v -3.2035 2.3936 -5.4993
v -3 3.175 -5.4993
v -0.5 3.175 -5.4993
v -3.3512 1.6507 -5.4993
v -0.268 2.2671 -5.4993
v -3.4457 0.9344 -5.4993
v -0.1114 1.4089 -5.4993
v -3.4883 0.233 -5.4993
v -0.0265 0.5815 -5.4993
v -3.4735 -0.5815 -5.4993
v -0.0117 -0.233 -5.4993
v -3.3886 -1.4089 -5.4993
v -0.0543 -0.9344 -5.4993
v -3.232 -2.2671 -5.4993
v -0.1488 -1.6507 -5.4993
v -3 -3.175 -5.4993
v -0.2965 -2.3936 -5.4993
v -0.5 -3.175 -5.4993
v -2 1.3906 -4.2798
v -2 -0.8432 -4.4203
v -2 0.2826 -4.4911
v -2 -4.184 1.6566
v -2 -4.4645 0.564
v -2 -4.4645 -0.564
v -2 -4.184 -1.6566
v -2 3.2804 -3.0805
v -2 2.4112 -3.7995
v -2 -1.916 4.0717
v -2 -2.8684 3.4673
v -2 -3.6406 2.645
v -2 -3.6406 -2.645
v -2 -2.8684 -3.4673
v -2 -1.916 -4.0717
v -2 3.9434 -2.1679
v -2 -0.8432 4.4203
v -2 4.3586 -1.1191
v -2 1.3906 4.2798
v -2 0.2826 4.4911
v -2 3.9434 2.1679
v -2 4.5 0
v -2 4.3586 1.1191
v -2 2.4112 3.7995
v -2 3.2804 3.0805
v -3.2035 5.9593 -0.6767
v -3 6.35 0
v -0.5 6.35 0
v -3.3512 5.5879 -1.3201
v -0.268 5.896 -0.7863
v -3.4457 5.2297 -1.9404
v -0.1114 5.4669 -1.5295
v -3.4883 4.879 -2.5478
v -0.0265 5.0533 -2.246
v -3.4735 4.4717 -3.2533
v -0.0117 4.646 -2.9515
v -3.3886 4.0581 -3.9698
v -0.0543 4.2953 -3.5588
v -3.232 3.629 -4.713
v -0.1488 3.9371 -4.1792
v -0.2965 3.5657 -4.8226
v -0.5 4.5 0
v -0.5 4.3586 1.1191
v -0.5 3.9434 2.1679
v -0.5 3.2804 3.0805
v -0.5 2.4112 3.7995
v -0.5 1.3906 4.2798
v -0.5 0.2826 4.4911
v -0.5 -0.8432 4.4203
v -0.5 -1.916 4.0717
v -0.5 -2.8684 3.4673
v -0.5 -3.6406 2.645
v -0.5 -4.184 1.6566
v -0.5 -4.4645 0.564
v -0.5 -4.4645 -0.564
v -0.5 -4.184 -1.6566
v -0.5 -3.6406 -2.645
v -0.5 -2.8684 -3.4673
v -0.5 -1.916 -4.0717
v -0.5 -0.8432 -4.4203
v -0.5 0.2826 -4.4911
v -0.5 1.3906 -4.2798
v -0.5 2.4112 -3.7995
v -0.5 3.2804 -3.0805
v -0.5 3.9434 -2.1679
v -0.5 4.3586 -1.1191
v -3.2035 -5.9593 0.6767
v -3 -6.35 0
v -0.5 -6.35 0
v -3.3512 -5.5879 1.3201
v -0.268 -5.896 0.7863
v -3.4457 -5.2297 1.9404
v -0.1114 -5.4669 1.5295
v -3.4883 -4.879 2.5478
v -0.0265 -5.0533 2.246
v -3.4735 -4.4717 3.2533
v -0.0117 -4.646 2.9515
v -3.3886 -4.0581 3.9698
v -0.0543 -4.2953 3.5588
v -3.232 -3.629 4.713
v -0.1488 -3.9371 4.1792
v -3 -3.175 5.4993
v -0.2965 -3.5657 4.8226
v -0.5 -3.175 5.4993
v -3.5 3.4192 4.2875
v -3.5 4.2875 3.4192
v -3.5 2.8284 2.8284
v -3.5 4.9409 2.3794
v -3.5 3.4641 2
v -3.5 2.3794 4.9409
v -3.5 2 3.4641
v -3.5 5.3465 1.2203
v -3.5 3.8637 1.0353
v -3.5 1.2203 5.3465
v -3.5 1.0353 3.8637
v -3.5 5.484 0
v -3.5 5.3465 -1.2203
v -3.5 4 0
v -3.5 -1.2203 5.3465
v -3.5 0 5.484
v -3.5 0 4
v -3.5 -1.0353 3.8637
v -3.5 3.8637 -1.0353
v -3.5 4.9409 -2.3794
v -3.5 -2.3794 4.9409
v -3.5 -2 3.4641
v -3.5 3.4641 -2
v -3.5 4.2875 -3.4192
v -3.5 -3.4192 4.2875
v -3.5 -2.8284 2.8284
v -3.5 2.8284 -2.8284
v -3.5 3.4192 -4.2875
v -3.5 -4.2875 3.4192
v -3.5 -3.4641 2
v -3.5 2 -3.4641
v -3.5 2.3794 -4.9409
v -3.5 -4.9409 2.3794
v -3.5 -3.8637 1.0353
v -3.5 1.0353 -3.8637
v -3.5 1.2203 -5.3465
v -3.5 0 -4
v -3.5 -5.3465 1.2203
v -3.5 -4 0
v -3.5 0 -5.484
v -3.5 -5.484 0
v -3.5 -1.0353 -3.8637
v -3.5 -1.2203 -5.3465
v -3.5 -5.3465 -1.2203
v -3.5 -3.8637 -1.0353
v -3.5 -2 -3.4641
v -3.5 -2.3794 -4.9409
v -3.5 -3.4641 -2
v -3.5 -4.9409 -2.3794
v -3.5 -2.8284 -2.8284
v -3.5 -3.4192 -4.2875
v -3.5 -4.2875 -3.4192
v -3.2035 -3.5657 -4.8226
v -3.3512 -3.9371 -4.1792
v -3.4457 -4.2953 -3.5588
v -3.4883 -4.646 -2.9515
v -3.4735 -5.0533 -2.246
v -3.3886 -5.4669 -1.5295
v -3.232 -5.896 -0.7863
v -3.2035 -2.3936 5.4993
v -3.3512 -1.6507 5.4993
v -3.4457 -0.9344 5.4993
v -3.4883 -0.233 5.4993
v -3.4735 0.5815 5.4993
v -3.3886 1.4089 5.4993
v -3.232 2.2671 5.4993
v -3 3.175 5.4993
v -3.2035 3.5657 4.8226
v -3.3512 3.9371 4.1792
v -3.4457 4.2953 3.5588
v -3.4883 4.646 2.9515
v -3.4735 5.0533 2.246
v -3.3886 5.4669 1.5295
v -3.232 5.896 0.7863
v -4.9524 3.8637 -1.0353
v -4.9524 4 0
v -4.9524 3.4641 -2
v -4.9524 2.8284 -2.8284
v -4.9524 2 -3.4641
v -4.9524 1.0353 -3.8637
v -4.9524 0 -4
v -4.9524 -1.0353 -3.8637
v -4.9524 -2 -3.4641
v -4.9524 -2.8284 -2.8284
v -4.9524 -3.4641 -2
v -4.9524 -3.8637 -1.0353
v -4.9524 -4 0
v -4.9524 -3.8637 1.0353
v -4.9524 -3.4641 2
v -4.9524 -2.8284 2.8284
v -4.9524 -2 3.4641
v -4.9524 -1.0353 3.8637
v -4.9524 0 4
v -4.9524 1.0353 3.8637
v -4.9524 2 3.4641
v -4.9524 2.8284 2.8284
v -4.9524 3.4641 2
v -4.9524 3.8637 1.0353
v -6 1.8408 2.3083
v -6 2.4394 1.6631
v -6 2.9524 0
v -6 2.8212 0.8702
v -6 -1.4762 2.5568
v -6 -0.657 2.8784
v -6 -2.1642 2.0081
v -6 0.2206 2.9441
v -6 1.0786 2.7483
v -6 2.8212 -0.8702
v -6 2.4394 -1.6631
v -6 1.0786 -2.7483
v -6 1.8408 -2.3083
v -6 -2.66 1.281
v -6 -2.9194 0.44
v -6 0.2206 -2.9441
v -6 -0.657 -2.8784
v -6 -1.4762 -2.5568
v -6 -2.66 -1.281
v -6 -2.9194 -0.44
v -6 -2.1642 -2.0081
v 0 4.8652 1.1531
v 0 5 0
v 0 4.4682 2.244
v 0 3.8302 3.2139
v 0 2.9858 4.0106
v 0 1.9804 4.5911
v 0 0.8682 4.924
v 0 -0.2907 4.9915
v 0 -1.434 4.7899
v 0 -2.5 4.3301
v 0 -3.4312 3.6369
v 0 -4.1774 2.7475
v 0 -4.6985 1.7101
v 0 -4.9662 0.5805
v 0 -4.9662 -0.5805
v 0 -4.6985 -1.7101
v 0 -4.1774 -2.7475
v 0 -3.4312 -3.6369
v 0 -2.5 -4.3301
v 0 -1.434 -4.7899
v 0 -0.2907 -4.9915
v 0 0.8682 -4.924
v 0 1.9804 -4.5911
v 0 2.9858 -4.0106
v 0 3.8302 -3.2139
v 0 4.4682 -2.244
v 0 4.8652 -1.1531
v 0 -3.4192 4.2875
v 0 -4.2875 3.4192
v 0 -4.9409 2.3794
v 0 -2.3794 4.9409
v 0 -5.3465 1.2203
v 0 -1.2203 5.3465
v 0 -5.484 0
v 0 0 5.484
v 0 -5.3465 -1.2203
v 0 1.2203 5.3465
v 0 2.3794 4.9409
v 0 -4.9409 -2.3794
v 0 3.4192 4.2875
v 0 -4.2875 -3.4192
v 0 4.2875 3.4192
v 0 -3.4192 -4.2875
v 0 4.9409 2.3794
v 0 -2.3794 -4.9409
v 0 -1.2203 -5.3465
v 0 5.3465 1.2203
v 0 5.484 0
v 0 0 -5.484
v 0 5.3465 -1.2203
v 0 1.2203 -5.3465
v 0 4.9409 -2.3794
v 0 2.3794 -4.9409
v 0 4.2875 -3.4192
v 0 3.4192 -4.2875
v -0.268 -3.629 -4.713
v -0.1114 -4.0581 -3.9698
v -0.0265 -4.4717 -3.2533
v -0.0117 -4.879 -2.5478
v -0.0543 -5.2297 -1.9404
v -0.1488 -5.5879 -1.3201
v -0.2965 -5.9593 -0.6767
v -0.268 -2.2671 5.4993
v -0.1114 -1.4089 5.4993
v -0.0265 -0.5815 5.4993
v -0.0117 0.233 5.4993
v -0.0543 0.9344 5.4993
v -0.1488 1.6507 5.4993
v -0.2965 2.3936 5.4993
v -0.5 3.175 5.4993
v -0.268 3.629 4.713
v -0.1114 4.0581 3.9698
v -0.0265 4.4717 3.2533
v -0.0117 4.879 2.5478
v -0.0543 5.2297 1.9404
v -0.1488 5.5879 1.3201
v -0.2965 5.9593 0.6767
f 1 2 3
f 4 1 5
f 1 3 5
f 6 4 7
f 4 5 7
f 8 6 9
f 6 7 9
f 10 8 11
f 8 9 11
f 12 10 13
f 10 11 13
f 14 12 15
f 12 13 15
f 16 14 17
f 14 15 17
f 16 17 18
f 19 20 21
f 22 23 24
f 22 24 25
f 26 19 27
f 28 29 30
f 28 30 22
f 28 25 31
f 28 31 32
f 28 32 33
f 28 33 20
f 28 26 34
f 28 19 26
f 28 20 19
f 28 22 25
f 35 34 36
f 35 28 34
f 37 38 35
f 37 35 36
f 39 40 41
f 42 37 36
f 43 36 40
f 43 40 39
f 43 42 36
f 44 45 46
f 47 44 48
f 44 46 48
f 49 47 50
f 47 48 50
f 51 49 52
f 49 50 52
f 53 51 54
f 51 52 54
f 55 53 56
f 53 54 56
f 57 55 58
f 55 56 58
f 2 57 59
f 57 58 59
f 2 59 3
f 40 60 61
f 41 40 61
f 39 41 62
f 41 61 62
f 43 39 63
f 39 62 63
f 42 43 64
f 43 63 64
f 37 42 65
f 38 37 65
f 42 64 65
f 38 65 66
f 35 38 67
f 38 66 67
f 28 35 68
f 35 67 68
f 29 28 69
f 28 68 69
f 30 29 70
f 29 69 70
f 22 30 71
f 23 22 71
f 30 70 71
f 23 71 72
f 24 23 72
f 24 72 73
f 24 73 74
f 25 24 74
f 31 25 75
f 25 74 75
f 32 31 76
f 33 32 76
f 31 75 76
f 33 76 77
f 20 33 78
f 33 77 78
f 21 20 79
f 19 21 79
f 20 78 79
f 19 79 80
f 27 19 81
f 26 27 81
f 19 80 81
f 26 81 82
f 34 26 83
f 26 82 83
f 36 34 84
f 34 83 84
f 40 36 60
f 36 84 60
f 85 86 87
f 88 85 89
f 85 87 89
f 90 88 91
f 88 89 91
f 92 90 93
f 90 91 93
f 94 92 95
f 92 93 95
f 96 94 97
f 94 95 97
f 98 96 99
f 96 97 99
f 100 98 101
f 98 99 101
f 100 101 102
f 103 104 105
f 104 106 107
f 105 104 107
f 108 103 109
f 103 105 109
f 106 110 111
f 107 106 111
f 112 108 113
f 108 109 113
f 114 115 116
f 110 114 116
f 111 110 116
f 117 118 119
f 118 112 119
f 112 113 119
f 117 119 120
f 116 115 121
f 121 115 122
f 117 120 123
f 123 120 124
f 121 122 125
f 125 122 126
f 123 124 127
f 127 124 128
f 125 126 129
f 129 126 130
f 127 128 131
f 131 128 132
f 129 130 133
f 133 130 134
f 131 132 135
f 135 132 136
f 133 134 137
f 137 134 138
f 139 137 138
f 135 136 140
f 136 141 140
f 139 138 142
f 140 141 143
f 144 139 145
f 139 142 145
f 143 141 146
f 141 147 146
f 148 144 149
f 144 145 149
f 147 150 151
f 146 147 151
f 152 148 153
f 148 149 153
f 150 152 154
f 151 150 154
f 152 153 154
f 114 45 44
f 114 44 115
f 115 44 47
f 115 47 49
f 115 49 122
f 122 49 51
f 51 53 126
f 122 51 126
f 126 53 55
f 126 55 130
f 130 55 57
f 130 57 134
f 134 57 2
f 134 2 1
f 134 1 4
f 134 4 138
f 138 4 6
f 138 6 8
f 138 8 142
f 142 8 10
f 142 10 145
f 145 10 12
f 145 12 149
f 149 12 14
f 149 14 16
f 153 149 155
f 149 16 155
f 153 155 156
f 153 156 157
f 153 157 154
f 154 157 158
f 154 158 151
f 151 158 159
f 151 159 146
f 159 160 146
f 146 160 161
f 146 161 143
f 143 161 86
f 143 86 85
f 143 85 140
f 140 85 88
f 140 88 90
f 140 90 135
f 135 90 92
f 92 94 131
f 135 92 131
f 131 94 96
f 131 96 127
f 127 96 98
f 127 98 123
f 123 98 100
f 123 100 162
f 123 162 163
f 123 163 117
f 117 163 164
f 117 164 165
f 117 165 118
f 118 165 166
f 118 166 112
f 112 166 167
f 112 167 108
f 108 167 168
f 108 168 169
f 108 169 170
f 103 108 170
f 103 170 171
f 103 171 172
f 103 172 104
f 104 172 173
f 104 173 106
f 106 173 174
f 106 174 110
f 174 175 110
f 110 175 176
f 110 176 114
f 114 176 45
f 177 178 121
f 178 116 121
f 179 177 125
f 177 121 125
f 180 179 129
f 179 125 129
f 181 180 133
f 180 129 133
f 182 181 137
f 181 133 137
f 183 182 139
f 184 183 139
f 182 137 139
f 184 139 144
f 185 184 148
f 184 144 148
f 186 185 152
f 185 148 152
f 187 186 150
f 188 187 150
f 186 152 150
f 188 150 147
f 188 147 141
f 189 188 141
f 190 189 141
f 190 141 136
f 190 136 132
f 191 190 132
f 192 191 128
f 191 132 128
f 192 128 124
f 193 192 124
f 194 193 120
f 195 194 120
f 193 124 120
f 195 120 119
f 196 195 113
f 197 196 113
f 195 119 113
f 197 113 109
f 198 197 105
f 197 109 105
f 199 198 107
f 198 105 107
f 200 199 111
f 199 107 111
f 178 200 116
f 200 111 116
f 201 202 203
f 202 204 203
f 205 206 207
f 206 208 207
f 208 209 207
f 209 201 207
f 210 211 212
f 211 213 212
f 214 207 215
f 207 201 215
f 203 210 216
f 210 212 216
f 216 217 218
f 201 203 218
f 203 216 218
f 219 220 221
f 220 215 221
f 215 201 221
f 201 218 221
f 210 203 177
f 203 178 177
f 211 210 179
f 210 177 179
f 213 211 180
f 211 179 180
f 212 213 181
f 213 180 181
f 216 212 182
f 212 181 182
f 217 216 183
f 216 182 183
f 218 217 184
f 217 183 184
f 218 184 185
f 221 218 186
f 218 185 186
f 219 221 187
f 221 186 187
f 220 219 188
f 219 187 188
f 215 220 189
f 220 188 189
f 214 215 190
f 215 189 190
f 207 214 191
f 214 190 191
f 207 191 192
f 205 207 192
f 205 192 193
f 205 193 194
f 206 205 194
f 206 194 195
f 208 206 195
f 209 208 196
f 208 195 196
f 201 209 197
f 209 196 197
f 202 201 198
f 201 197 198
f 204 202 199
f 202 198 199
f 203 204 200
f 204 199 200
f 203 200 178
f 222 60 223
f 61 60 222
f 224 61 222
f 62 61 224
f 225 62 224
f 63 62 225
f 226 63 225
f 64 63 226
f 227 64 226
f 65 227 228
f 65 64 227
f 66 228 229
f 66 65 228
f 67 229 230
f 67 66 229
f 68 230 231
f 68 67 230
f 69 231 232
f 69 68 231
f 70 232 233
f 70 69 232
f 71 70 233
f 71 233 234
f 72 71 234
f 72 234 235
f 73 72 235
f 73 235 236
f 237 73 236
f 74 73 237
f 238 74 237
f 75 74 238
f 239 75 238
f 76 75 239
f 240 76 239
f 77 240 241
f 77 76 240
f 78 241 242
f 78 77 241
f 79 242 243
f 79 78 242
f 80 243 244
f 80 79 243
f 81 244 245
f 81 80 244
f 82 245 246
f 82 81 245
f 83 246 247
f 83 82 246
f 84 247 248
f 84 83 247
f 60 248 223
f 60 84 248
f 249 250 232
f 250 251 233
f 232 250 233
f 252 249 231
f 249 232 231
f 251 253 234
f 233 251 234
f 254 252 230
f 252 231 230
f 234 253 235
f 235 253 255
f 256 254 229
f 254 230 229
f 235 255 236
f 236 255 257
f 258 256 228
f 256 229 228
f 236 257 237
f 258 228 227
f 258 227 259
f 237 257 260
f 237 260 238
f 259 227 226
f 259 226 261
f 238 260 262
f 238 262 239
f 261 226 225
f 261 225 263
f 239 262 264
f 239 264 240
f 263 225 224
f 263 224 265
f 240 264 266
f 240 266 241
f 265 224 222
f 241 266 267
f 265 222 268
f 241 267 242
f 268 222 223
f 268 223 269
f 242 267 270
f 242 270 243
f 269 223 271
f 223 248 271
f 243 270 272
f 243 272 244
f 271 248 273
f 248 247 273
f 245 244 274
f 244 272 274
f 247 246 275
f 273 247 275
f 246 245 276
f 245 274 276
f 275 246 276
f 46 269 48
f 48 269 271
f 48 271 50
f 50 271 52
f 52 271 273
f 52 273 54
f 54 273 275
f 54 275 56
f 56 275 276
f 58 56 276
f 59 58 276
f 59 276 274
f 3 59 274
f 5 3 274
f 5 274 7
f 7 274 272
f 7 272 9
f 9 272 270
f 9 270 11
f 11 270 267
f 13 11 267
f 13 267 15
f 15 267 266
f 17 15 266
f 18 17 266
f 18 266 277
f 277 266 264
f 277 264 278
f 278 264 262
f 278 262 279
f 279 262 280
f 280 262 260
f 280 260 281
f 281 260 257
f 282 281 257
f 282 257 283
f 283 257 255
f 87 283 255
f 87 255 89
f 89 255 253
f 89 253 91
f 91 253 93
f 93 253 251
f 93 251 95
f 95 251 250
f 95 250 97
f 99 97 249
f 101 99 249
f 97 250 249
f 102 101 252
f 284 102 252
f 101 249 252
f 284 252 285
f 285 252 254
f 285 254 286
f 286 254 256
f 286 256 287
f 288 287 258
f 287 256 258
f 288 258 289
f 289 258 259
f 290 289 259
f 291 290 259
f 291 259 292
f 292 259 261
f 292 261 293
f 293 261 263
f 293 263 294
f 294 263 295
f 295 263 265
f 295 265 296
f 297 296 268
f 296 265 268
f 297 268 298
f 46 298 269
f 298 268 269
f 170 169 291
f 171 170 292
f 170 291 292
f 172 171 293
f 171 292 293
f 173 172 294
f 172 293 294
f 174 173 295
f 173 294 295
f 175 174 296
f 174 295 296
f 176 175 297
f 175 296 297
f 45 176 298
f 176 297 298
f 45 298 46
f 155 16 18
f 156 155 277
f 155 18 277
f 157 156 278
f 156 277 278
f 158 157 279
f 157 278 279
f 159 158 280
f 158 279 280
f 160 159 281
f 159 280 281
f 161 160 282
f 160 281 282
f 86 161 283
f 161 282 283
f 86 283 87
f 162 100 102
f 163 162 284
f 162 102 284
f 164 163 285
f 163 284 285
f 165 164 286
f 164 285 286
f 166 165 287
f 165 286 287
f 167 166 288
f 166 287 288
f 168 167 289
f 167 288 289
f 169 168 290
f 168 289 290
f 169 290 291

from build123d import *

# Parameters (mm, degrees)
CUT_EXTRUDE_1_DEPTH = 10
SKETCH_3_R          = 4.5
CUT_EXTRUDE_2_DEPTH = 2
CHAMFER_1_SIZE      = 0.5


with BuildPart() as part:
    # Эскиз1 → Повернуть1 (revolve)
    with BuildSketch(Plane.XY, mode=Mode.PRIVATE) as revolve_1_sk:
        Polygon((0, 0), (-6, 0), (-6, -2.952380952), (-4.952380952, -4), (-3.5, -4), (-3.5, -5.483974596), (-3, -6.35), (-0.5, -6.35), (0, -5.483974596), align=None)
    revolve(revolve_1_sk.sketch.rotate(Axis((0, 0, 0), (-1, 0, 0)), 180), axis=Axis((0, 0, 0), (-1, 0, 0)))

    # Эскиз2 → Вырез-Вытянуть1 (cut)
    with BuildSketch(Plane(origin=(0, 0, 0), x_dir=(0, 0, -1), z_dir=(1, 0, 0))):
        with BuildLine():
            Line((-5.499261314, 3.175), (0, 6.35))
            ThreePointArc((0, 6.35), (-3.175, 5.499261314), (-5.499261314, 3.175))
        make_face()
        with BuildLine():
            ThreePointArc((5.499261314, 3.175), (3.175, 5.499261314), (0, 6.35))
            Line((0, 6.35), (5.499261314, 3.175))
        make_face()
        with BuildLine():
            ThreePointArc((6.35, 0), (6.133628997, 1.643500936), (5.499261314, 3.175))
            Line((5.499261314, 3.175), (5.499261314, -3.175))
            ThreePointArc((5.499261314, -3.175), (6.133628997, -1.643500936), (6.35, 0))
        make_face()
        with BuildLine():
            ThreePointArc((0, -6.35), (3.175, -5.499261314), (5.499261314, -3.175))
            Line((5.499261314, -3.175), (0, -6.35))
        make_face()
        with BuildLine():
            Line((0, -6.35), (-5.499261314, -3.175))
            ThreePointArc((-5.499261314, -3.175), (-3.175, -5.499261314), (0, -6.35))
        make_face()
        with BuildLine():
            Line((-5.499261314, -3.175), (-5.499261314, 3.175))
            ThreePointArc((-5.499261314, 3.175), (-6.35, 0), (-5.499261314, -3.175))
        make_face()
    extrude(amount=-CUT_EXTRUDE_1_DEPTH, mode=Mode.SUBTRACT)

    # Эскиз3 → Вырез-Вытянуть2 (cut)
    with BuildSketch(Plane(origin=(0, 0, 0), x_dir=(0, 0, -1), z_dir=(1, 0, 0))):
        with Locations(Location((0, 0, 0), (0, 0, 90))):
            Circle(SKETCH_3_R)
    extrude(amount=-CUT_EXTRUDE_2_DEPTH, mode=Mode.SUBTRACT)

    # Фаска1
    chamfer_1_edges = [part.edges().sort_by_distance(p)[0] for p in [
        (0, -4.5, 0),
    ]]
    chamfer(chamfer_1_edges, length=CHAMFER_1_SIZE)


solid = part.part
